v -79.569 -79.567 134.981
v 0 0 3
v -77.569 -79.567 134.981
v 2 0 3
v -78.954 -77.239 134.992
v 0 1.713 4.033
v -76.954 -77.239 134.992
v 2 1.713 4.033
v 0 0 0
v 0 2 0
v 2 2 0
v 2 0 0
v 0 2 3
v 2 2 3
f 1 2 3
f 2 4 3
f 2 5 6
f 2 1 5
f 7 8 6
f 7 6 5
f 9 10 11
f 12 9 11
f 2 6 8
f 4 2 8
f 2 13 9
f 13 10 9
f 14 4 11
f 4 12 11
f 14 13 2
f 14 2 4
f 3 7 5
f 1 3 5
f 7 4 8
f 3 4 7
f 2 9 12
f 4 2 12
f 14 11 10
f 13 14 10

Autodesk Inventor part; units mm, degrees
ref_plane "YZ Plane" through (0, 0, 0) normal (1, 0, 0) x (0, 1, 0)
sketch "Skizze1" plane through (0, 0, 0) normal (0, 0, 1) x (1, 0, 0)
  line L0 (0, 0) -> (2, 0)
  line L1 (2, 0) -> (2, 2)
  line L2 (2, 2) -> (0, 2)
  line L3 (0, 2) -> (0, 0)
  dimension "d0" = 2
  dimension "d1" = 2
extrude "Extrusion1" add sketch "Skizze1" along normal blind 3
sketch "Skizze2" plane through (0, 0, 3) normal (0, 0, 1) x (1, 0, 0)
  point P0 (0, 0)
ref_plane "Arbeitsebene1" through (0, 0, 3) normal (-0.7071, 0.7071, 0) x (0.7071, 0.7071, 0)
sketch "Skizze3" plane through (0, 0, 3) normal (-0.7071, 0.7071, 0) x (0.7071, 0.7071, 0)
  line L0 (0, 0) -> (1.4142, 0) projected
  line L1 (0, 0) -> (-112.5245, -131.9823)
  line L2 (0, 0) -> (173.439, 0) construction
  line L3 (2.8284, 3) -> (2.8284, 0) projected
  line L4 (2.8284, 0) -> (-109.6961, -131.9823)
  line L5 (2.8284, 0) -> (176.2674, 0) construction
  line L6 (-109.6961, -131.9823) -> (-112.5245, -131.9823)
  line L7 (1.4142, 0) -> (2.8284, 0) projected
  line L8 (2.8284, 0) -> (0, 0)
  point P0 (0, 3)
  dimension "d4" = 173.439
  dimension "d5" = 130.45
  dimension "d6" = 173.439
  dimension "d7" = 130.45
ref_plane "Arbeitsebene2" through (0, 0, 3) normal (0, 0.8564, 0.5163) x (-0.4588, -0.4588, 0.761)
sketch "Skizze4" plane through (0, 0, 3) normal (0, 0.8564, 0.5163) x (-0.4588, -0.4588, 0.761)
  line L0 (0, 0) -> (-0.9175, 1.7771) projected
  line L1 (0, 0) -> (-0.9175, 1.7771)
  line L2 (-0.9175, 1.7771) -> (172.5215, 1.7771)
  line L3 (172.5215, 1.7771) -> (173.439, 0)
  line L4 (173.439, 0) -> (0, 0)
  point P0 (-2.2829, -1.1787)
  dimension "d9" = 173.439
extrude "Extrusion2" add sketch "Skizze4" along normal blind 2
sketch "Skizze5" plane through (-77.5668, -79.5668, 134.9823) normal (0.8886, -0.2369, 0.3929) x (0.4588, 0.4588, -0.761)
  line L0 (172.5215, 0) -> (-0.9175, 0) projected
  line L1 (0.0005, 0) -> (1.3553, 2)
  line L2 (0, 2) -> (173.439, 2) projected
  line L3 (1.3553, 2) -> (0, 2)
  line L4 (0, 0) -> (0, 2) projected
  line L5 (0, 2) -> (0, 0)
  point P0 (174.8044, -1.5489)
sketch "Skizze6" plane through (0, 0, 3) normal (0, -0.8564, -0.5163) x (0.8886, -0.2369, 0.3929)
  line L0 (0, 0) -> (0, 173.439) projected
  line L1 (1.7771, 172.5215) -> (0, 173.439)
  point P0 (-1.1787, -2.2829)
sketch "Skizze7" plane through (0, 1.7128, 4.0326) normal (0, 0.8564, 0.5163) x (0.8886, -0.2369, 0.3929)
  line L0 (0, 0) -> (0, -173.439) projected
  line L1 (0, -172.1027) -> (1.781, -171.1647)
  point P0 (-1.1787, 2.2829)
sketch "Skizze8" plane through (0, 0, 3) normal (-0.8886, 0.2369, -0.3929) x (-0.4588, -0.4588, 0.761)
  line L0 (0, 2) -> (173.439, 2) projected
  line L1 (0, 0) -> (173.439, 0) projected
  line L2 (172.1026, 2) -> (173.439, 0)
  point P0 (-2.2829, -1.5489)
chamfer "Fase1" distance 1.1929 distance2 2 1 edges at (-78.5668, -77.854, 136.0149) measured on face at (-25.1889, -24.8095, 48.0267)
properties part number "FOVStick"
